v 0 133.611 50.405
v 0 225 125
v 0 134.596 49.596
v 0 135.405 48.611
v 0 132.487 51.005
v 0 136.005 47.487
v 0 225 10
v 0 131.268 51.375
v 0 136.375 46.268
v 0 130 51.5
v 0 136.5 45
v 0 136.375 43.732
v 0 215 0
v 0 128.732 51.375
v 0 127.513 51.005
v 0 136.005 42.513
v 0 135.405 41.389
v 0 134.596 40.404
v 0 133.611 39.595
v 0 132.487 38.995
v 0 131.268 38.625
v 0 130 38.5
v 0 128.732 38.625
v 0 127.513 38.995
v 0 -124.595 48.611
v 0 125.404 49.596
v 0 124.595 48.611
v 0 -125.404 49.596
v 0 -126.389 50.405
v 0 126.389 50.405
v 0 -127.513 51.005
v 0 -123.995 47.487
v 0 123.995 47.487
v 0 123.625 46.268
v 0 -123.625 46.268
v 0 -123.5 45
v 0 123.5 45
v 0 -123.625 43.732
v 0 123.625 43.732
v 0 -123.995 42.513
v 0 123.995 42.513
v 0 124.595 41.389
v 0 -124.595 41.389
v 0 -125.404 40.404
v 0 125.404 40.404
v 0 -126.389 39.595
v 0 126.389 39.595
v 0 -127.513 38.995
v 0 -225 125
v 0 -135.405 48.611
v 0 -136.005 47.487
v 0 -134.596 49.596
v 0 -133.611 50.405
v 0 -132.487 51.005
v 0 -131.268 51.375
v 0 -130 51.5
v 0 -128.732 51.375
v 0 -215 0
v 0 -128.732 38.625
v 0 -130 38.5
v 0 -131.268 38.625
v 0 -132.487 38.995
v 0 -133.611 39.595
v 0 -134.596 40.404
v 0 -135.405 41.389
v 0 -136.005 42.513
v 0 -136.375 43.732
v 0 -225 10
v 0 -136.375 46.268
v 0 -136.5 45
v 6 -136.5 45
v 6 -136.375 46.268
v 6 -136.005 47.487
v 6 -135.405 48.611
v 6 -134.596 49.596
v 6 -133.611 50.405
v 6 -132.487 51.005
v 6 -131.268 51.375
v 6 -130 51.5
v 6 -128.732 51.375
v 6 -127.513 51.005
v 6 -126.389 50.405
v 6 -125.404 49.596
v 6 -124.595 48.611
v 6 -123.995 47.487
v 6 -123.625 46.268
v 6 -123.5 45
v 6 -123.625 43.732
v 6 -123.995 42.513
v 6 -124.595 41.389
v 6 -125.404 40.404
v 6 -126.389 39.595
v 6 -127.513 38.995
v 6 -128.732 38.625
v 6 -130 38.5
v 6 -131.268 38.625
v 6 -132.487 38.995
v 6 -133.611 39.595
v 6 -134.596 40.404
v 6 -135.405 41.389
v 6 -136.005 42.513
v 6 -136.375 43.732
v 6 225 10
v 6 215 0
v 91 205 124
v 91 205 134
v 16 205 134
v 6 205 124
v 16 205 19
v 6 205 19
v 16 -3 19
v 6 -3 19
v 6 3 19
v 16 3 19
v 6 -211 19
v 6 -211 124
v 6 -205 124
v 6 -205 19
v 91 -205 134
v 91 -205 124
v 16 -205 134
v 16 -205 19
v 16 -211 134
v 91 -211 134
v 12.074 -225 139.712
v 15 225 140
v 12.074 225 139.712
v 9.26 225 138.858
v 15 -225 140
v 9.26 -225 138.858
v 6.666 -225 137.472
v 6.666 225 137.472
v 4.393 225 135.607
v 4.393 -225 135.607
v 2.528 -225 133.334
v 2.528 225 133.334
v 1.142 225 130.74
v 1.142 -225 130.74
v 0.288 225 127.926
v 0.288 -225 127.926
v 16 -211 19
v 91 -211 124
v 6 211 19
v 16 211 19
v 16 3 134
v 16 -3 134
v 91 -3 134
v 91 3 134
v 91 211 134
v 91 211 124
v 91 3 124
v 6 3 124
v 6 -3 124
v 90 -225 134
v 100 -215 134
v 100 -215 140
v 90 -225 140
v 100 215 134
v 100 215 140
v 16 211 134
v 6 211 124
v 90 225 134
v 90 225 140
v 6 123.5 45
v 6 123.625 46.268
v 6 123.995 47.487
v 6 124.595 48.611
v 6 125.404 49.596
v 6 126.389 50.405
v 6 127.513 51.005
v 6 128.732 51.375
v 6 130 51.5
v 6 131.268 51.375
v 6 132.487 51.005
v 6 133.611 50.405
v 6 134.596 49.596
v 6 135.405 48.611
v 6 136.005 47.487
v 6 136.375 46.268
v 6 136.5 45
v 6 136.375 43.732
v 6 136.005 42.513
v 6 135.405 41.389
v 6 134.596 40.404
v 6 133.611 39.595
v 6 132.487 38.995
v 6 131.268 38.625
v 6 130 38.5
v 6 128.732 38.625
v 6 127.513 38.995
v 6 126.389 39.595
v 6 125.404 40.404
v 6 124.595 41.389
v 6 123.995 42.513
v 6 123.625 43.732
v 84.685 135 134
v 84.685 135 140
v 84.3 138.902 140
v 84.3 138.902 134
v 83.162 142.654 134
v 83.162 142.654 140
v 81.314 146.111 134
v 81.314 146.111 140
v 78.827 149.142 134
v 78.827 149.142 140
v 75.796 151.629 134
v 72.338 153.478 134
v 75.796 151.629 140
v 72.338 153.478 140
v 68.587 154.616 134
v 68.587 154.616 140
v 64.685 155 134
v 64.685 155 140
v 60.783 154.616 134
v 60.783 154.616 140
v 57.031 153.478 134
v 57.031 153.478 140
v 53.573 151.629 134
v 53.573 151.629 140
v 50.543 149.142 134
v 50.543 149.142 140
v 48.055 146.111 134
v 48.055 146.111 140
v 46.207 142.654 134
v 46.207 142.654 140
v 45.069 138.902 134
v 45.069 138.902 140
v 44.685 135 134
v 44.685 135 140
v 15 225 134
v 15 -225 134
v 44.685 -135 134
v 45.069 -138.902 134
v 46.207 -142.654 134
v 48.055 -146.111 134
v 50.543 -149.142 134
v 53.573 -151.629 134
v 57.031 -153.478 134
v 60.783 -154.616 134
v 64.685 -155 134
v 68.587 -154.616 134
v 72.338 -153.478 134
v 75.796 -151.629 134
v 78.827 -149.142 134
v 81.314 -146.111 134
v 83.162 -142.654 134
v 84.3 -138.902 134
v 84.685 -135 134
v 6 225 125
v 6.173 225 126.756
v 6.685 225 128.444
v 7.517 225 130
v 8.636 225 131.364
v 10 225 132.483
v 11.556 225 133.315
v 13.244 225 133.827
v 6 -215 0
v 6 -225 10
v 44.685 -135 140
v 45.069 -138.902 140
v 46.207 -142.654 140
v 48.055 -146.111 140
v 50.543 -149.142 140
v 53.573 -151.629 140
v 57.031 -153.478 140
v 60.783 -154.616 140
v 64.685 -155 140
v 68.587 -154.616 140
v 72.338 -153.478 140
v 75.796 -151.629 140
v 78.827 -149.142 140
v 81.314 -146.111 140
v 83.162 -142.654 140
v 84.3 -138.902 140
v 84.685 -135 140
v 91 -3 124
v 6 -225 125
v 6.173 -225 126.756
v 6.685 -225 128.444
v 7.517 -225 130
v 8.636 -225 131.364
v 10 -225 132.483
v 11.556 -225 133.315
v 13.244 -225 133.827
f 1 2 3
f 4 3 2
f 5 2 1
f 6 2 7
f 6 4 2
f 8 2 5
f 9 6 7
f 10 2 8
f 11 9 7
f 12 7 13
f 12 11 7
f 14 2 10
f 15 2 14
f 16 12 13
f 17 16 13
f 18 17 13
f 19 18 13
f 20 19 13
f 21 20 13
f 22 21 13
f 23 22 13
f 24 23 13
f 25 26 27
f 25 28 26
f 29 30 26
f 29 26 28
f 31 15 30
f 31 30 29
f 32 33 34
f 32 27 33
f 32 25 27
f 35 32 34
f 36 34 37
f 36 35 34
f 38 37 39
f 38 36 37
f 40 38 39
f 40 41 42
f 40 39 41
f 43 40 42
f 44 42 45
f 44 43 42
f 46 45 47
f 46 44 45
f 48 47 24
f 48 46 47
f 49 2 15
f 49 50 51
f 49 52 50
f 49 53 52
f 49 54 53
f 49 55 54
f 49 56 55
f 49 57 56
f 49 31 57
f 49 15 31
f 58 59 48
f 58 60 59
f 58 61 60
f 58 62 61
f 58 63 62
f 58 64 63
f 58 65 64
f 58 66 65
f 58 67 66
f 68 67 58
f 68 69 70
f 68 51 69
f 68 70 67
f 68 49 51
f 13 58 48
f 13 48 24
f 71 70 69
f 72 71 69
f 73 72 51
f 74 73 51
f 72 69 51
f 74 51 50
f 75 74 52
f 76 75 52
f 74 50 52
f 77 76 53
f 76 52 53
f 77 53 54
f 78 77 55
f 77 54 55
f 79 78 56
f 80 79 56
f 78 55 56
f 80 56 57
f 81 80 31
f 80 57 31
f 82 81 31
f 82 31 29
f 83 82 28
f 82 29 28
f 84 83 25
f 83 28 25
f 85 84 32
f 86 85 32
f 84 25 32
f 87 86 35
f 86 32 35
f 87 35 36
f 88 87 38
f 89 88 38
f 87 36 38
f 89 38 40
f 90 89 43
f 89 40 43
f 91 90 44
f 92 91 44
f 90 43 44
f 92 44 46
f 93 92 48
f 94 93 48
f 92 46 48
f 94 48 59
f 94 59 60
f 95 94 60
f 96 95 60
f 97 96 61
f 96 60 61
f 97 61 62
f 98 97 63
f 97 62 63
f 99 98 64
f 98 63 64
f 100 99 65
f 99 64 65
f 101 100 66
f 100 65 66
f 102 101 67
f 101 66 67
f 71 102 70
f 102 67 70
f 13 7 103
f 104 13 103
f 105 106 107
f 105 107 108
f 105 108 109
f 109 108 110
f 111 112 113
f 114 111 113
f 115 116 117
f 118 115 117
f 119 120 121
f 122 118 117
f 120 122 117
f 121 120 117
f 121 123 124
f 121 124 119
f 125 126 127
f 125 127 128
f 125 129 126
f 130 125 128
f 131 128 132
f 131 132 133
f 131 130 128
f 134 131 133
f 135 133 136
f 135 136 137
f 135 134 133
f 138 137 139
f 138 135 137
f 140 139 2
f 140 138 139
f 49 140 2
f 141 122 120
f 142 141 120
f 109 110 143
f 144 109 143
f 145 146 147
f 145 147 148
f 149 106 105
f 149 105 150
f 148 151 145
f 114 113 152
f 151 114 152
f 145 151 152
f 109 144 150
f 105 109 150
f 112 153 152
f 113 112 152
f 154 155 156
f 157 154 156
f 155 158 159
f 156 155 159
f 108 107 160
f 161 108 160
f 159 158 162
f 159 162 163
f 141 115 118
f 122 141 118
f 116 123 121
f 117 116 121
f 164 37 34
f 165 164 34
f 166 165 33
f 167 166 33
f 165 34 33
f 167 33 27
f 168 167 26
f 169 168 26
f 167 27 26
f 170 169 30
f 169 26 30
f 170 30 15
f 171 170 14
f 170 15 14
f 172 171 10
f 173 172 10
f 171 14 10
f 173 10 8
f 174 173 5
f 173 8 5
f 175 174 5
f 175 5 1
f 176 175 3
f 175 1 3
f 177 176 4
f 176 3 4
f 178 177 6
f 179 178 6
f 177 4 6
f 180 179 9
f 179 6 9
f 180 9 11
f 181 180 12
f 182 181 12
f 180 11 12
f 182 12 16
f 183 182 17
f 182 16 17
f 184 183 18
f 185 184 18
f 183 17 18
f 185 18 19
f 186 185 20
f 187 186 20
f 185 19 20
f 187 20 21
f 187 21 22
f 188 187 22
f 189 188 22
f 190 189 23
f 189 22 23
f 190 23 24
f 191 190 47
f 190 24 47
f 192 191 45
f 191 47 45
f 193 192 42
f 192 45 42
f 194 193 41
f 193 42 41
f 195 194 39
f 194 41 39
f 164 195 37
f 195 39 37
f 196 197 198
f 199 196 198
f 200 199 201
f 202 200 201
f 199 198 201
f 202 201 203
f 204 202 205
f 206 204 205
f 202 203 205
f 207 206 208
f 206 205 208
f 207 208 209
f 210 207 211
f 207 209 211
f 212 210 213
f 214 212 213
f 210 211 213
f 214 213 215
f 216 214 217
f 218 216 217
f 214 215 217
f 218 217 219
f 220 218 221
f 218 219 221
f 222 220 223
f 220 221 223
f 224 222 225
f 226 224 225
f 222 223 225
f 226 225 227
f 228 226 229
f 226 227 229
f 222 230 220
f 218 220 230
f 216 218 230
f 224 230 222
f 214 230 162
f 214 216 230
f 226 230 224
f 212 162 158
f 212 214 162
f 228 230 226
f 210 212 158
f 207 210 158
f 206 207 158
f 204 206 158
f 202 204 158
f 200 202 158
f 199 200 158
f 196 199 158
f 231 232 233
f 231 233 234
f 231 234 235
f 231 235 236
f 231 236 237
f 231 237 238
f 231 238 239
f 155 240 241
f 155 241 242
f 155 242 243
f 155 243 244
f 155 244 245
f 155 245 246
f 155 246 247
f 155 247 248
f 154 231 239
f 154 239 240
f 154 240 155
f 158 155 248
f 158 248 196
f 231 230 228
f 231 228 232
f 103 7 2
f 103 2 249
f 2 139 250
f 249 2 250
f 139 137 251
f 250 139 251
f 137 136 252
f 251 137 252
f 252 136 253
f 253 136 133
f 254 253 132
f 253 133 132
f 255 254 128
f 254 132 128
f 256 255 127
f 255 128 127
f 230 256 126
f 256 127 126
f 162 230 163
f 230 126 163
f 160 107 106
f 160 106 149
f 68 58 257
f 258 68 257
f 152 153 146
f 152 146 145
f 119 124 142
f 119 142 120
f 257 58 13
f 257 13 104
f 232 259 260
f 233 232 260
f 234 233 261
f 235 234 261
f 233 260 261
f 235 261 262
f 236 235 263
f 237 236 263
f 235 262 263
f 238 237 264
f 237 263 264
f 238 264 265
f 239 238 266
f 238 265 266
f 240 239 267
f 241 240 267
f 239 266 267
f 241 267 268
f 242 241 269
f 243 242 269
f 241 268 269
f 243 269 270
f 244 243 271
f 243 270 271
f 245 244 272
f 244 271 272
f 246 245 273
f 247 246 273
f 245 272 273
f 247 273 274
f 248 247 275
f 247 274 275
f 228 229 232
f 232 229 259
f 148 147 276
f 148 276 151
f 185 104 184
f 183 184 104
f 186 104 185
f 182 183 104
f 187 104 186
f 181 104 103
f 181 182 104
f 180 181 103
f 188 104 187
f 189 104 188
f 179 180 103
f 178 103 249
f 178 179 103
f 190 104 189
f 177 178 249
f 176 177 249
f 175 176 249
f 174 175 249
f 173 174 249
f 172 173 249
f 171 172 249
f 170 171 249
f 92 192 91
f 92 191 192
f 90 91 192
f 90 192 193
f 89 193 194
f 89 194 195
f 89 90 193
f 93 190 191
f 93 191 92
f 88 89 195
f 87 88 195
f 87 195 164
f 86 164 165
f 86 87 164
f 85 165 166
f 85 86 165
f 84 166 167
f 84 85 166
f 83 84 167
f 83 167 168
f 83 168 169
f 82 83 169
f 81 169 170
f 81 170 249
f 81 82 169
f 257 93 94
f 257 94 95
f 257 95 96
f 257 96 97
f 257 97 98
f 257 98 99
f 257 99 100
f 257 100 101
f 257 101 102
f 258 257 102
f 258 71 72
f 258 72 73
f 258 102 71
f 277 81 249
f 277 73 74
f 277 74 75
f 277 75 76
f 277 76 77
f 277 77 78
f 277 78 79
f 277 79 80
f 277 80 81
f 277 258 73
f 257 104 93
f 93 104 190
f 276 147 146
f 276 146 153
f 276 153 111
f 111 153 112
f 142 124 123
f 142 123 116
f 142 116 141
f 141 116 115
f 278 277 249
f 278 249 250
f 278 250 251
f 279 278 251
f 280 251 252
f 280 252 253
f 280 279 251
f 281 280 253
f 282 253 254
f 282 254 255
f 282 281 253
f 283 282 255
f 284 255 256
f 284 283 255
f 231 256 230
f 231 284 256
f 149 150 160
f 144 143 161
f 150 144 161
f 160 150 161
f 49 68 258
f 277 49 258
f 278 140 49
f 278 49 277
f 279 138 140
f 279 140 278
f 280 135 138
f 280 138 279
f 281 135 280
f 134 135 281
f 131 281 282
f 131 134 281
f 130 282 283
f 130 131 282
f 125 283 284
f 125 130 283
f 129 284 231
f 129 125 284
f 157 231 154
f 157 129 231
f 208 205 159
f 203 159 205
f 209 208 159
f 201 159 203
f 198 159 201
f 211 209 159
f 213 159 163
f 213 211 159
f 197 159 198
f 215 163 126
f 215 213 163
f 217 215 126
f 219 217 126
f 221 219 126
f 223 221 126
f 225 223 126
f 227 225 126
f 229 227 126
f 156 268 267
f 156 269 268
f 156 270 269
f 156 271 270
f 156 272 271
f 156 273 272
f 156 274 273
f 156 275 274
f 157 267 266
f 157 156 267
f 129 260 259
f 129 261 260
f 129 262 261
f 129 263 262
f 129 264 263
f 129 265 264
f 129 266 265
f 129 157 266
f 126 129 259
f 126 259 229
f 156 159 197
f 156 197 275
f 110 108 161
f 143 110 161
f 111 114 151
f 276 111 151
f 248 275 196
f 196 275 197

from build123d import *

# Parameters (mm, degrees)
F1_DEPTH  = 225
F2_W      = 6
F2_H      = 9
F2_H_2    = 106
F3_DEPTH  = 85
F4_SIZE   = 10
F4_2_SIZE = 10
F4_3_SIZE = 10
F6_DEPTH  = 450
F7_SIZE   = 10
F9_DEPTH  = 6
F10_R     = 6.5
F11_DEPTH = 6


with BuildPart() as f1:
    # F0 (on Front) → F1 (new body, symmetric)
    with BuildSketch(Plane.XZ):
        with BuildLine():
            Line((0, 125), (0, 0))
            Line((0, 0), (6, 0))
            Line((6, 0), (6, 125))
            ThreePointArc((6, 125), (8.6360389693, 131.3639610307), (15, 134))
            Line((15, 134), (100, 134))
            Line((100, 134), (100, 140))
            Line((100, 140), (15, 140))
            ThreePointArc((15, 140), (4.3933982822, 135.6066017178), (0, 125))
        make_face()
    extrude(amount=F1_DEPTH, both=True)

    # F7
    f7_edges = [f1.edges().sort_by_distance(p)[0] for p in [
        (100, 225, 137),
        (3, 225, 0),
        (100, -225, 137),
        (3, -225, 0),
    ]]
    chamfer(f7_edges, length=F7_SIZE)

    # F8 (on face) → F9 (cut)
    with BuildSketch(Plane.XY.offset(140)):
        with BuildLine():
            Line((84.6847039461, -135), (84.6847039461, 135))
            ThreePointArc((84.6847039461, 135), (64.6847039461, 155), (44.6847039461, 135))
            Line((44.6847039461, 135), (44.6847039461, -135))
            ThreePointArc((44.6847039461, -135), (64.6847039461, -155), (84.6847039461, -135))
        make_face()
    extrude(amount=-F9_DEPTH, mode=Mode.SUBTRACT)

    # F10 (on face) → F11 (cut)
    with BuildSketch(Plane(origin=(0, 0, 0), x_dir=(0, -1, 0), z_dir=(-1, 0, 0))):
        with Locations((-130, 45)):
            Circle(F10_R)
        with Locations((130, 45)):
            Circle(F10_R)
    extrude(amount=-F11_DEPTH, mode=Mode.SUBTRACT)


with BuildPart() as f3:
    # F2 (on face) → F3 (new body)
    with BuildSketch(Plane.YZ.offset(6)):
        with Locations((-208, 129.5)):
            Rectangle(F2_W, F2_H)
        with Locations((-208, 72)):
            Rectangle(F2_W, F2_H_2)
    extrude(amount=F3_DEPTH)

    # F4#3
    f4_3_edges = [f3.edges().sort_by_distance(p)[0] for p in [
        (6, -208, 134),
    ]]
    chamfer(f4_3_edges, length=F4_3_SIZE)


with BuildPart() as f3b:
    # F2 (on face) → F3, piece 2 (new body)
    with BuildSketch(Plane.YZ.offset(6)):
        with Locations((0, 129.5)):
            Rectangle(F2_W, F2_H)
        with Locations((0, 72)):
            Rectangle(F2_W, F2_H_2)
    extrude(amount=F3_DEPTH)

    # F4#2
    f4_2_edges = [f3b.edges().sort_by_distance(p)[0] for p in [
        (6, 0, 134),
    ]]
    chamfer(f4_2_edges, length=F4_2_SIZE)


with BuildPart() as f3c:
    # F2 (on face) → F3, piece 3 (new body)
    with BuildSketch(Plane.YZ.offset(6)):
        with Locations((208, 72)):
            Rectangle(F2_W, F2_H_2)
        with Locations((208, 129.5)):
            Rectangle(F2_W, F2_H)
    extrude(amount=F3_DEPTH)

    # F4
    f4_edges = [f3c.edges().sort_by_distance(p)[0] for p in [
        (6, 208, 134),
    ]]
    chamfer(f4_edges, length=F4_SIZE)


with BuildPart() as f6_tool:
    # F5 (on face) → F6 (new body)
    with BuildSketch(Plane(origin=(0, 211, 0), x_dir=(-1, 0, 0), z_dir=(0, 1, 0))):
        Polygon((-16, 19), (-91, 124), (-91, 19), align=None)
    extrude(amount=-F6_DEPTH)


with BuildPart() as f3_1:
    add(f3.part)

    # F6: cut by f6_tool
    add(f6_tool.part, mode=Mode.SUBTRACT)


with BuildPart() as f3b_1:
    add(f3b.part)

    # F6: cut by f6_tool
    add(f6_tool.part, mode=Mode.SUBTRACT)


with BuildPart() as f3c_1:
    add(f3c.part)

    # F6: cut by f6_tool
    add(f6_tool.part, mode=Mode.SUBTRACT)


solid = Compound([f1.part, f3_1.part, f3b_1.part, f3c_1.part])
